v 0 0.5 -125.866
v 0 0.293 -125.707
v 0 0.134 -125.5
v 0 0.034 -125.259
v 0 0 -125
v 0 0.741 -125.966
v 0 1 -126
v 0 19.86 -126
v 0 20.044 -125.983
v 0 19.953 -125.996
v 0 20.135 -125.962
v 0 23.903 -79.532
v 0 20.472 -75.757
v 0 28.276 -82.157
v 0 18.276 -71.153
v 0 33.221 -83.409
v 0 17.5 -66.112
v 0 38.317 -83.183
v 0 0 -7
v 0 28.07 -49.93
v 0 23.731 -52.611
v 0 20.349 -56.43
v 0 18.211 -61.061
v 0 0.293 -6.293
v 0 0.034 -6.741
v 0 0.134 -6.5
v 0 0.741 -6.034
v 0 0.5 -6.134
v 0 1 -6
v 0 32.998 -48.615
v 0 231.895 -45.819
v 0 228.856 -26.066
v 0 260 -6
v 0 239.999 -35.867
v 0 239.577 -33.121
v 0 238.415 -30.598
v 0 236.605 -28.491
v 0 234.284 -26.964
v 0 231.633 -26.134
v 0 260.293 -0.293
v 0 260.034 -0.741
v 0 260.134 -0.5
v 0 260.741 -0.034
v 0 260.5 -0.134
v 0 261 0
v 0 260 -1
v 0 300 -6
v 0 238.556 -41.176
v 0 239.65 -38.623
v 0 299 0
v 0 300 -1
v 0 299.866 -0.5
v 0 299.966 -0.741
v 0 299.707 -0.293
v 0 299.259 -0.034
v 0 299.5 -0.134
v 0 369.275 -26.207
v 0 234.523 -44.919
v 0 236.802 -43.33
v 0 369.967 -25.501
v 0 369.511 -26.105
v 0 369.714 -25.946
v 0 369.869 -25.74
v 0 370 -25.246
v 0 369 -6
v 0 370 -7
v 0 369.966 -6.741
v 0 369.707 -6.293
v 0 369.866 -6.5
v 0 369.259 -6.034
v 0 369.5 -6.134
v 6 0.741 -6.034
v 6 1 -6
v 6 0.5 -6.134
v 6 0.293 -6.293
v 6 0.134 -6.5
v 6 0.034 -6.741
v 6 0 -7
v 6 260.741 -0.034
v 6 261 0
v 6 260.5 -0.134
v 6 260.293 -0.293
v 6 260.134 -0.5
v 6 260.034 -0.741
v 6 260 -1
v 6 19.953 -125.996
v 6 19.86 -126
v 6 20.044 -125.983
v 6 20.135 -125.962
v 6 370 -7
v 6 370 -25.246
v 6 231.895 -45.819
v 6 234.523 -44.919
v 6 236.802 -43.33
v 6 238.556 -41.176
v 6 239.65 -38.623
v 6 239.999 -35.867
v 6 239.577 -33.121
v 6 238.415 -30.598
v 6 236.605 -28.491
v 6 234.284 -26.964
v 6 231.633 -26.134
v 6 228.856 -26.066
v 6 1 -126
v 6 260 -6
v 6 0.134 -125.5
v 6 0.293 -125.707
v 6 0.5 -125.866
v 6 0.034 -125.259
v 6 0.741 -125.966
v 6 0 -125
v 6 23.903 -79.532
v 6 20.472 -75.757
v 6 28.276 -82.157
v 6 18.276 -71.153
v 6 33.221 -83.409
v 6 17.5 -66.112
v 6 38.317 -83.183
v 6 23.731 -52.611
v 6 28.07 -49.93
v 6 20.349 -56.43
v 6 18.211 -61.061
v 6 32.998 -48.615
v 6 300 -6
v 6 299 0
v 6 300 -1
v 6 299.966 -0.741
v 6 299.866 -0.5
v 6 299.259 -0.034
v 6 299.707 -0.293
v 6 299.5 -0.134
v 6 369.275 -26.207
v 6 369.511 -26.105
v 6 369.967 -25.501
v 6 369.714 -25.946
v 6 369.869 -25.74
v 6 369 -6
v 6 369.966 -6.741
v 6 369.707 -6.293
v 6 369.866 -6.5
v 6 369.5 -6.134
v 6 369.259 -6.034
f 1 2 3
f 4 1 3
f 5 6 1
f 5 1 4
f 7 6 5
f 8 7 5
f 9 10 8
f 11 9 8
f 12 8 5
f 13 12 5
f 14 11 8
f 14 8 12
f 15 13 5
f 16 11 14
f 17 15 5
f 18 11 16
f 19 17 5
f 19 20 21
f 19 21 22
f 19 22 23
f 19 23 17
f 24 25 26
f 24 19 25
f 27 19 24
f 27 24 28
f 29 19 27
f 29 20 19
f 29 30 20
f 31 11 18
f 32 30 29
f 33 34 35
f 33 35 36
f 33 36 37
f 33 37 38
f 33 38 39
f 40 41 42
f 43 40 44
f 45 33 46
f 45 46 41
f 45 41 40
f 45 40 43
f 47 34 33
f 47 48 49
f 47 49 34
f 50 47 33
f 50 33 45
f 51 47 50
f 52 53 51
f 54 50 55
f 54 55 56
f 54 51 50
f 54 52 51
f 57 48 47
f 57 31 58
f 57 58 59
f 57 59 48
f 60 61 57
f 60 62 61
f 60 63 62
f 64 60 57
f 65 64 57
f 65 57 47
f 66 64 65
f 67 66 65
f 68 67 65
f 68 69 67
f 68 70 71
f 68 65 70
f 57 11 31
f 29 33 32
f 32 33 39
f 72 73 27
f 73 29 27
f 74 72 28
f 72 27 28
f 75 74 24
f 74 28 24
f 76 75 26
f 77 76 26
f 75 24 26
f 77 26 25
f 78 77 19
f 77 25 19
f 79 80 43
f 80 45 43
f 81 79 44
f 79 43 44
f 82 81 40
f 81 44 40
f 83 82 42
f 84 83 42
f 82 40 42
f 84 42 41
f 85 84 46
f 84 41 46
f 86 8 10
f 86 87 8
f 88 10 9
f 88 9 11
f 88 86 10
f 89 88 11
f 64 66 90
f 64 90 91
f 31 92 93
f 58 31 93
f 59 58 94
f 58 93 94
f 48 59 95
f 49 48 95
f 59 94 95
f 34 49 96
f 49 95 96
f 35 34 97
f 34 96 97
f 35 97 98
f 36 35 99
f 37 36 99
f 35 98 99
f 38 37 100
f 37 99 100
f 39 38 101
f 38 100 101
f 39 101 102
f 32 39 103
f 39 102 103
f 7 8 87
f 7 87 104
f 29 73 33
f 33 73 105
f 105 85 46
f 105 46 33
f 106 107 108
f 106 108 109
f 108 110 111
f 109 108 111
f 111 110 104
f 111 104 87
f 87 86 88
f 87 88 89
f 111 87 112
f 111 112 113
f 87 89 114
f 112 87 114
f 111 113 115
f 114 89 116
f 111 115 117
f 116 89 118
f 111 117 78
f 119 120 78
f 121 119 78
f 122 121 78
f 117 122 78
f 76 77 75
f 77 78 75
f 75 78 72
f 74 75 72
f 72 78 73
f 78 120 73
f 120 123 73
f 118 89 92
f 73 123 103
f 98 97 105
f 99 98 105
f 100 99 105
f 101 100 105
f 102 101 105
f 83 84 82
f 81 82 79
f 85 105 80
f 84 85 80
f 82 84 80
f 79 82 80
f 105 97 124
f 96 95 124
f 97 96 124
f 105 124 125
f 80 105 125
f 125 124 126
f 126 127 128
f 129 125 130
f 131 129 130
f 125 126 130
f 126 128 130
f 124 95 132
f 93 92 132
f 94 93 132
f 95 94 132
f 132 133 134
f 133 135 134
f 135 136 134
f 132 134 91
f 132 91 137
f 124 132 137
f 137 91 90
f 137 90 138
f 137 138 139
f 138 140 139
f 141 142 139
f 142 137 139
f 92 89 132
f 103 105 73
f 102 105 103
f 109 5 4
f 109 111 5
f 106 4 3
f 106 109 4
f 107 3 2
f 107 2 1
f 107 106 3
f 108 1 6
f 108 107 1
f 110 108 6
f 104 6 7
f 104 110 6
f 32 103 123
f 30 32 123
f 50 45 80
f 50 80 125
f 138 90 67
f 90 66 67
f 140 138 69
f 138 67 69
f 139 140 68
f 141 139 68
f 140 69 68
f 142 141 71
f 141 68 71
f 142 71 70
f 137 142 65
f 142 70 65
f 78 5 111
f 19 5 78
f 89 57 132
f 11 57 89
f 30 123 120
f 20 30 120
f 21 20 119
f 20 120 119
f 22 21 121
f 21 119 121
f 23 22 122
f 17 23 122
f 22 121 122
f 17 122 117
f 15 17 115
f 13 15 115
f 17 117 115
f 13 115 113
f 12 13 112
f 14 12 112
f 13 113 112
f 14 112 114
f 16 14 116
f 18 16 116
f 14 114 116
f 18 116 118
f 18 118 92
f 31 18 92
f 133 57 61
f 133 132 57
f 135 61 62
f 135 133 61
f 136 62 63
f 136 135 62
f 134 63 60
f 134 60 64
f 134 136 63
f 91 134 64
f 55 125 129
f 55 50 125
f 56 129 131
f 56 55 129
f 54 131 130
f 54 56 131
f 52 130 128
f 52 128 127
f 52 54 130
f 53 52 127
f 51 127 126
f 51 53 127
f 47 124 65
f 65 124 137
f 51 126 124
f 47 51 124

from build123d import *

# Parameters (mm, degrees)
CORNER_DEPTH = 6
SKETCH2_W    = 6
SKETCH2_H    = 70
SKETCH2_H_2  = 260
MOUNT_DEPTH  = 10
FILLET1_R    = 1
LITE_DEPTH   = 391.911754748


with BuildPart() as part:
    # Sketch1 → corner (new body)
    with BuildSketch(Plane(origin=(0, 0, 0), x_dir=(0, 0, -1), z_dir=(1, 0, 0))):
        Polygon((0, 0), (0, 370), (26, 370), (126, 20), (126, 0), align=None)
    extrude(amount=CORNER_DEPTH)

    # Sketch2 → mount (cut)
    with BuildSketch(Plane(origin=(6, 0, 0), x_dir=(0, 0, -1), z_dir=(1, 0, 0))):
        with Locations((3, 335)):
            Rectangle(SKETCH2_W, SKETCH2_H)
        with Locations((3, 130)):
            Rectangle(SKETCH2_W, SKETCH2_H_2)
    extrude(amount=-MOUNT_DEPTH, mode=Mode.SUBTRACT)

    # Fillet1
    fillet1_edges = [part.edges().sort_by_distance(p)[0] for p in [
        (3, 370, -6),
        (3, 300, 0),
        (3, 260, 0),
        (3, 0, -6),
        (3, 370, -26),
        (3, 20, -126),
        (3, 0, -126),
    ]]
    fillet(fillet1_edges, radius=FILLET1_R)

    # Sketch3 → lite (cut, through all)
    with BuildSketch(Plane(origin=(6, 0, 0), x_dir=(0, 0, -1), z_dir=(1, 0, 0))):
        with BuildLine():
            Line((26.065623551, 228.856249777), (48.614841214, 32.99843711))
            ThreePointArc((48.614841214, 32.99843711), (68.661000724, 17.703495291), (83.182846647, 38.316591792))
            Line((83.182846647, 38.316591792), (45.818769512, 231.89519531))
            ThreePointArc((45.818769512, 231.89519531), (34.479428157, 239.883716977), (26.065623551, 228.856249777))
        make_face()
    extrude(amount=-LITE_DEPTH, mode=Mode.SUBTRACT)


solid = part.part
